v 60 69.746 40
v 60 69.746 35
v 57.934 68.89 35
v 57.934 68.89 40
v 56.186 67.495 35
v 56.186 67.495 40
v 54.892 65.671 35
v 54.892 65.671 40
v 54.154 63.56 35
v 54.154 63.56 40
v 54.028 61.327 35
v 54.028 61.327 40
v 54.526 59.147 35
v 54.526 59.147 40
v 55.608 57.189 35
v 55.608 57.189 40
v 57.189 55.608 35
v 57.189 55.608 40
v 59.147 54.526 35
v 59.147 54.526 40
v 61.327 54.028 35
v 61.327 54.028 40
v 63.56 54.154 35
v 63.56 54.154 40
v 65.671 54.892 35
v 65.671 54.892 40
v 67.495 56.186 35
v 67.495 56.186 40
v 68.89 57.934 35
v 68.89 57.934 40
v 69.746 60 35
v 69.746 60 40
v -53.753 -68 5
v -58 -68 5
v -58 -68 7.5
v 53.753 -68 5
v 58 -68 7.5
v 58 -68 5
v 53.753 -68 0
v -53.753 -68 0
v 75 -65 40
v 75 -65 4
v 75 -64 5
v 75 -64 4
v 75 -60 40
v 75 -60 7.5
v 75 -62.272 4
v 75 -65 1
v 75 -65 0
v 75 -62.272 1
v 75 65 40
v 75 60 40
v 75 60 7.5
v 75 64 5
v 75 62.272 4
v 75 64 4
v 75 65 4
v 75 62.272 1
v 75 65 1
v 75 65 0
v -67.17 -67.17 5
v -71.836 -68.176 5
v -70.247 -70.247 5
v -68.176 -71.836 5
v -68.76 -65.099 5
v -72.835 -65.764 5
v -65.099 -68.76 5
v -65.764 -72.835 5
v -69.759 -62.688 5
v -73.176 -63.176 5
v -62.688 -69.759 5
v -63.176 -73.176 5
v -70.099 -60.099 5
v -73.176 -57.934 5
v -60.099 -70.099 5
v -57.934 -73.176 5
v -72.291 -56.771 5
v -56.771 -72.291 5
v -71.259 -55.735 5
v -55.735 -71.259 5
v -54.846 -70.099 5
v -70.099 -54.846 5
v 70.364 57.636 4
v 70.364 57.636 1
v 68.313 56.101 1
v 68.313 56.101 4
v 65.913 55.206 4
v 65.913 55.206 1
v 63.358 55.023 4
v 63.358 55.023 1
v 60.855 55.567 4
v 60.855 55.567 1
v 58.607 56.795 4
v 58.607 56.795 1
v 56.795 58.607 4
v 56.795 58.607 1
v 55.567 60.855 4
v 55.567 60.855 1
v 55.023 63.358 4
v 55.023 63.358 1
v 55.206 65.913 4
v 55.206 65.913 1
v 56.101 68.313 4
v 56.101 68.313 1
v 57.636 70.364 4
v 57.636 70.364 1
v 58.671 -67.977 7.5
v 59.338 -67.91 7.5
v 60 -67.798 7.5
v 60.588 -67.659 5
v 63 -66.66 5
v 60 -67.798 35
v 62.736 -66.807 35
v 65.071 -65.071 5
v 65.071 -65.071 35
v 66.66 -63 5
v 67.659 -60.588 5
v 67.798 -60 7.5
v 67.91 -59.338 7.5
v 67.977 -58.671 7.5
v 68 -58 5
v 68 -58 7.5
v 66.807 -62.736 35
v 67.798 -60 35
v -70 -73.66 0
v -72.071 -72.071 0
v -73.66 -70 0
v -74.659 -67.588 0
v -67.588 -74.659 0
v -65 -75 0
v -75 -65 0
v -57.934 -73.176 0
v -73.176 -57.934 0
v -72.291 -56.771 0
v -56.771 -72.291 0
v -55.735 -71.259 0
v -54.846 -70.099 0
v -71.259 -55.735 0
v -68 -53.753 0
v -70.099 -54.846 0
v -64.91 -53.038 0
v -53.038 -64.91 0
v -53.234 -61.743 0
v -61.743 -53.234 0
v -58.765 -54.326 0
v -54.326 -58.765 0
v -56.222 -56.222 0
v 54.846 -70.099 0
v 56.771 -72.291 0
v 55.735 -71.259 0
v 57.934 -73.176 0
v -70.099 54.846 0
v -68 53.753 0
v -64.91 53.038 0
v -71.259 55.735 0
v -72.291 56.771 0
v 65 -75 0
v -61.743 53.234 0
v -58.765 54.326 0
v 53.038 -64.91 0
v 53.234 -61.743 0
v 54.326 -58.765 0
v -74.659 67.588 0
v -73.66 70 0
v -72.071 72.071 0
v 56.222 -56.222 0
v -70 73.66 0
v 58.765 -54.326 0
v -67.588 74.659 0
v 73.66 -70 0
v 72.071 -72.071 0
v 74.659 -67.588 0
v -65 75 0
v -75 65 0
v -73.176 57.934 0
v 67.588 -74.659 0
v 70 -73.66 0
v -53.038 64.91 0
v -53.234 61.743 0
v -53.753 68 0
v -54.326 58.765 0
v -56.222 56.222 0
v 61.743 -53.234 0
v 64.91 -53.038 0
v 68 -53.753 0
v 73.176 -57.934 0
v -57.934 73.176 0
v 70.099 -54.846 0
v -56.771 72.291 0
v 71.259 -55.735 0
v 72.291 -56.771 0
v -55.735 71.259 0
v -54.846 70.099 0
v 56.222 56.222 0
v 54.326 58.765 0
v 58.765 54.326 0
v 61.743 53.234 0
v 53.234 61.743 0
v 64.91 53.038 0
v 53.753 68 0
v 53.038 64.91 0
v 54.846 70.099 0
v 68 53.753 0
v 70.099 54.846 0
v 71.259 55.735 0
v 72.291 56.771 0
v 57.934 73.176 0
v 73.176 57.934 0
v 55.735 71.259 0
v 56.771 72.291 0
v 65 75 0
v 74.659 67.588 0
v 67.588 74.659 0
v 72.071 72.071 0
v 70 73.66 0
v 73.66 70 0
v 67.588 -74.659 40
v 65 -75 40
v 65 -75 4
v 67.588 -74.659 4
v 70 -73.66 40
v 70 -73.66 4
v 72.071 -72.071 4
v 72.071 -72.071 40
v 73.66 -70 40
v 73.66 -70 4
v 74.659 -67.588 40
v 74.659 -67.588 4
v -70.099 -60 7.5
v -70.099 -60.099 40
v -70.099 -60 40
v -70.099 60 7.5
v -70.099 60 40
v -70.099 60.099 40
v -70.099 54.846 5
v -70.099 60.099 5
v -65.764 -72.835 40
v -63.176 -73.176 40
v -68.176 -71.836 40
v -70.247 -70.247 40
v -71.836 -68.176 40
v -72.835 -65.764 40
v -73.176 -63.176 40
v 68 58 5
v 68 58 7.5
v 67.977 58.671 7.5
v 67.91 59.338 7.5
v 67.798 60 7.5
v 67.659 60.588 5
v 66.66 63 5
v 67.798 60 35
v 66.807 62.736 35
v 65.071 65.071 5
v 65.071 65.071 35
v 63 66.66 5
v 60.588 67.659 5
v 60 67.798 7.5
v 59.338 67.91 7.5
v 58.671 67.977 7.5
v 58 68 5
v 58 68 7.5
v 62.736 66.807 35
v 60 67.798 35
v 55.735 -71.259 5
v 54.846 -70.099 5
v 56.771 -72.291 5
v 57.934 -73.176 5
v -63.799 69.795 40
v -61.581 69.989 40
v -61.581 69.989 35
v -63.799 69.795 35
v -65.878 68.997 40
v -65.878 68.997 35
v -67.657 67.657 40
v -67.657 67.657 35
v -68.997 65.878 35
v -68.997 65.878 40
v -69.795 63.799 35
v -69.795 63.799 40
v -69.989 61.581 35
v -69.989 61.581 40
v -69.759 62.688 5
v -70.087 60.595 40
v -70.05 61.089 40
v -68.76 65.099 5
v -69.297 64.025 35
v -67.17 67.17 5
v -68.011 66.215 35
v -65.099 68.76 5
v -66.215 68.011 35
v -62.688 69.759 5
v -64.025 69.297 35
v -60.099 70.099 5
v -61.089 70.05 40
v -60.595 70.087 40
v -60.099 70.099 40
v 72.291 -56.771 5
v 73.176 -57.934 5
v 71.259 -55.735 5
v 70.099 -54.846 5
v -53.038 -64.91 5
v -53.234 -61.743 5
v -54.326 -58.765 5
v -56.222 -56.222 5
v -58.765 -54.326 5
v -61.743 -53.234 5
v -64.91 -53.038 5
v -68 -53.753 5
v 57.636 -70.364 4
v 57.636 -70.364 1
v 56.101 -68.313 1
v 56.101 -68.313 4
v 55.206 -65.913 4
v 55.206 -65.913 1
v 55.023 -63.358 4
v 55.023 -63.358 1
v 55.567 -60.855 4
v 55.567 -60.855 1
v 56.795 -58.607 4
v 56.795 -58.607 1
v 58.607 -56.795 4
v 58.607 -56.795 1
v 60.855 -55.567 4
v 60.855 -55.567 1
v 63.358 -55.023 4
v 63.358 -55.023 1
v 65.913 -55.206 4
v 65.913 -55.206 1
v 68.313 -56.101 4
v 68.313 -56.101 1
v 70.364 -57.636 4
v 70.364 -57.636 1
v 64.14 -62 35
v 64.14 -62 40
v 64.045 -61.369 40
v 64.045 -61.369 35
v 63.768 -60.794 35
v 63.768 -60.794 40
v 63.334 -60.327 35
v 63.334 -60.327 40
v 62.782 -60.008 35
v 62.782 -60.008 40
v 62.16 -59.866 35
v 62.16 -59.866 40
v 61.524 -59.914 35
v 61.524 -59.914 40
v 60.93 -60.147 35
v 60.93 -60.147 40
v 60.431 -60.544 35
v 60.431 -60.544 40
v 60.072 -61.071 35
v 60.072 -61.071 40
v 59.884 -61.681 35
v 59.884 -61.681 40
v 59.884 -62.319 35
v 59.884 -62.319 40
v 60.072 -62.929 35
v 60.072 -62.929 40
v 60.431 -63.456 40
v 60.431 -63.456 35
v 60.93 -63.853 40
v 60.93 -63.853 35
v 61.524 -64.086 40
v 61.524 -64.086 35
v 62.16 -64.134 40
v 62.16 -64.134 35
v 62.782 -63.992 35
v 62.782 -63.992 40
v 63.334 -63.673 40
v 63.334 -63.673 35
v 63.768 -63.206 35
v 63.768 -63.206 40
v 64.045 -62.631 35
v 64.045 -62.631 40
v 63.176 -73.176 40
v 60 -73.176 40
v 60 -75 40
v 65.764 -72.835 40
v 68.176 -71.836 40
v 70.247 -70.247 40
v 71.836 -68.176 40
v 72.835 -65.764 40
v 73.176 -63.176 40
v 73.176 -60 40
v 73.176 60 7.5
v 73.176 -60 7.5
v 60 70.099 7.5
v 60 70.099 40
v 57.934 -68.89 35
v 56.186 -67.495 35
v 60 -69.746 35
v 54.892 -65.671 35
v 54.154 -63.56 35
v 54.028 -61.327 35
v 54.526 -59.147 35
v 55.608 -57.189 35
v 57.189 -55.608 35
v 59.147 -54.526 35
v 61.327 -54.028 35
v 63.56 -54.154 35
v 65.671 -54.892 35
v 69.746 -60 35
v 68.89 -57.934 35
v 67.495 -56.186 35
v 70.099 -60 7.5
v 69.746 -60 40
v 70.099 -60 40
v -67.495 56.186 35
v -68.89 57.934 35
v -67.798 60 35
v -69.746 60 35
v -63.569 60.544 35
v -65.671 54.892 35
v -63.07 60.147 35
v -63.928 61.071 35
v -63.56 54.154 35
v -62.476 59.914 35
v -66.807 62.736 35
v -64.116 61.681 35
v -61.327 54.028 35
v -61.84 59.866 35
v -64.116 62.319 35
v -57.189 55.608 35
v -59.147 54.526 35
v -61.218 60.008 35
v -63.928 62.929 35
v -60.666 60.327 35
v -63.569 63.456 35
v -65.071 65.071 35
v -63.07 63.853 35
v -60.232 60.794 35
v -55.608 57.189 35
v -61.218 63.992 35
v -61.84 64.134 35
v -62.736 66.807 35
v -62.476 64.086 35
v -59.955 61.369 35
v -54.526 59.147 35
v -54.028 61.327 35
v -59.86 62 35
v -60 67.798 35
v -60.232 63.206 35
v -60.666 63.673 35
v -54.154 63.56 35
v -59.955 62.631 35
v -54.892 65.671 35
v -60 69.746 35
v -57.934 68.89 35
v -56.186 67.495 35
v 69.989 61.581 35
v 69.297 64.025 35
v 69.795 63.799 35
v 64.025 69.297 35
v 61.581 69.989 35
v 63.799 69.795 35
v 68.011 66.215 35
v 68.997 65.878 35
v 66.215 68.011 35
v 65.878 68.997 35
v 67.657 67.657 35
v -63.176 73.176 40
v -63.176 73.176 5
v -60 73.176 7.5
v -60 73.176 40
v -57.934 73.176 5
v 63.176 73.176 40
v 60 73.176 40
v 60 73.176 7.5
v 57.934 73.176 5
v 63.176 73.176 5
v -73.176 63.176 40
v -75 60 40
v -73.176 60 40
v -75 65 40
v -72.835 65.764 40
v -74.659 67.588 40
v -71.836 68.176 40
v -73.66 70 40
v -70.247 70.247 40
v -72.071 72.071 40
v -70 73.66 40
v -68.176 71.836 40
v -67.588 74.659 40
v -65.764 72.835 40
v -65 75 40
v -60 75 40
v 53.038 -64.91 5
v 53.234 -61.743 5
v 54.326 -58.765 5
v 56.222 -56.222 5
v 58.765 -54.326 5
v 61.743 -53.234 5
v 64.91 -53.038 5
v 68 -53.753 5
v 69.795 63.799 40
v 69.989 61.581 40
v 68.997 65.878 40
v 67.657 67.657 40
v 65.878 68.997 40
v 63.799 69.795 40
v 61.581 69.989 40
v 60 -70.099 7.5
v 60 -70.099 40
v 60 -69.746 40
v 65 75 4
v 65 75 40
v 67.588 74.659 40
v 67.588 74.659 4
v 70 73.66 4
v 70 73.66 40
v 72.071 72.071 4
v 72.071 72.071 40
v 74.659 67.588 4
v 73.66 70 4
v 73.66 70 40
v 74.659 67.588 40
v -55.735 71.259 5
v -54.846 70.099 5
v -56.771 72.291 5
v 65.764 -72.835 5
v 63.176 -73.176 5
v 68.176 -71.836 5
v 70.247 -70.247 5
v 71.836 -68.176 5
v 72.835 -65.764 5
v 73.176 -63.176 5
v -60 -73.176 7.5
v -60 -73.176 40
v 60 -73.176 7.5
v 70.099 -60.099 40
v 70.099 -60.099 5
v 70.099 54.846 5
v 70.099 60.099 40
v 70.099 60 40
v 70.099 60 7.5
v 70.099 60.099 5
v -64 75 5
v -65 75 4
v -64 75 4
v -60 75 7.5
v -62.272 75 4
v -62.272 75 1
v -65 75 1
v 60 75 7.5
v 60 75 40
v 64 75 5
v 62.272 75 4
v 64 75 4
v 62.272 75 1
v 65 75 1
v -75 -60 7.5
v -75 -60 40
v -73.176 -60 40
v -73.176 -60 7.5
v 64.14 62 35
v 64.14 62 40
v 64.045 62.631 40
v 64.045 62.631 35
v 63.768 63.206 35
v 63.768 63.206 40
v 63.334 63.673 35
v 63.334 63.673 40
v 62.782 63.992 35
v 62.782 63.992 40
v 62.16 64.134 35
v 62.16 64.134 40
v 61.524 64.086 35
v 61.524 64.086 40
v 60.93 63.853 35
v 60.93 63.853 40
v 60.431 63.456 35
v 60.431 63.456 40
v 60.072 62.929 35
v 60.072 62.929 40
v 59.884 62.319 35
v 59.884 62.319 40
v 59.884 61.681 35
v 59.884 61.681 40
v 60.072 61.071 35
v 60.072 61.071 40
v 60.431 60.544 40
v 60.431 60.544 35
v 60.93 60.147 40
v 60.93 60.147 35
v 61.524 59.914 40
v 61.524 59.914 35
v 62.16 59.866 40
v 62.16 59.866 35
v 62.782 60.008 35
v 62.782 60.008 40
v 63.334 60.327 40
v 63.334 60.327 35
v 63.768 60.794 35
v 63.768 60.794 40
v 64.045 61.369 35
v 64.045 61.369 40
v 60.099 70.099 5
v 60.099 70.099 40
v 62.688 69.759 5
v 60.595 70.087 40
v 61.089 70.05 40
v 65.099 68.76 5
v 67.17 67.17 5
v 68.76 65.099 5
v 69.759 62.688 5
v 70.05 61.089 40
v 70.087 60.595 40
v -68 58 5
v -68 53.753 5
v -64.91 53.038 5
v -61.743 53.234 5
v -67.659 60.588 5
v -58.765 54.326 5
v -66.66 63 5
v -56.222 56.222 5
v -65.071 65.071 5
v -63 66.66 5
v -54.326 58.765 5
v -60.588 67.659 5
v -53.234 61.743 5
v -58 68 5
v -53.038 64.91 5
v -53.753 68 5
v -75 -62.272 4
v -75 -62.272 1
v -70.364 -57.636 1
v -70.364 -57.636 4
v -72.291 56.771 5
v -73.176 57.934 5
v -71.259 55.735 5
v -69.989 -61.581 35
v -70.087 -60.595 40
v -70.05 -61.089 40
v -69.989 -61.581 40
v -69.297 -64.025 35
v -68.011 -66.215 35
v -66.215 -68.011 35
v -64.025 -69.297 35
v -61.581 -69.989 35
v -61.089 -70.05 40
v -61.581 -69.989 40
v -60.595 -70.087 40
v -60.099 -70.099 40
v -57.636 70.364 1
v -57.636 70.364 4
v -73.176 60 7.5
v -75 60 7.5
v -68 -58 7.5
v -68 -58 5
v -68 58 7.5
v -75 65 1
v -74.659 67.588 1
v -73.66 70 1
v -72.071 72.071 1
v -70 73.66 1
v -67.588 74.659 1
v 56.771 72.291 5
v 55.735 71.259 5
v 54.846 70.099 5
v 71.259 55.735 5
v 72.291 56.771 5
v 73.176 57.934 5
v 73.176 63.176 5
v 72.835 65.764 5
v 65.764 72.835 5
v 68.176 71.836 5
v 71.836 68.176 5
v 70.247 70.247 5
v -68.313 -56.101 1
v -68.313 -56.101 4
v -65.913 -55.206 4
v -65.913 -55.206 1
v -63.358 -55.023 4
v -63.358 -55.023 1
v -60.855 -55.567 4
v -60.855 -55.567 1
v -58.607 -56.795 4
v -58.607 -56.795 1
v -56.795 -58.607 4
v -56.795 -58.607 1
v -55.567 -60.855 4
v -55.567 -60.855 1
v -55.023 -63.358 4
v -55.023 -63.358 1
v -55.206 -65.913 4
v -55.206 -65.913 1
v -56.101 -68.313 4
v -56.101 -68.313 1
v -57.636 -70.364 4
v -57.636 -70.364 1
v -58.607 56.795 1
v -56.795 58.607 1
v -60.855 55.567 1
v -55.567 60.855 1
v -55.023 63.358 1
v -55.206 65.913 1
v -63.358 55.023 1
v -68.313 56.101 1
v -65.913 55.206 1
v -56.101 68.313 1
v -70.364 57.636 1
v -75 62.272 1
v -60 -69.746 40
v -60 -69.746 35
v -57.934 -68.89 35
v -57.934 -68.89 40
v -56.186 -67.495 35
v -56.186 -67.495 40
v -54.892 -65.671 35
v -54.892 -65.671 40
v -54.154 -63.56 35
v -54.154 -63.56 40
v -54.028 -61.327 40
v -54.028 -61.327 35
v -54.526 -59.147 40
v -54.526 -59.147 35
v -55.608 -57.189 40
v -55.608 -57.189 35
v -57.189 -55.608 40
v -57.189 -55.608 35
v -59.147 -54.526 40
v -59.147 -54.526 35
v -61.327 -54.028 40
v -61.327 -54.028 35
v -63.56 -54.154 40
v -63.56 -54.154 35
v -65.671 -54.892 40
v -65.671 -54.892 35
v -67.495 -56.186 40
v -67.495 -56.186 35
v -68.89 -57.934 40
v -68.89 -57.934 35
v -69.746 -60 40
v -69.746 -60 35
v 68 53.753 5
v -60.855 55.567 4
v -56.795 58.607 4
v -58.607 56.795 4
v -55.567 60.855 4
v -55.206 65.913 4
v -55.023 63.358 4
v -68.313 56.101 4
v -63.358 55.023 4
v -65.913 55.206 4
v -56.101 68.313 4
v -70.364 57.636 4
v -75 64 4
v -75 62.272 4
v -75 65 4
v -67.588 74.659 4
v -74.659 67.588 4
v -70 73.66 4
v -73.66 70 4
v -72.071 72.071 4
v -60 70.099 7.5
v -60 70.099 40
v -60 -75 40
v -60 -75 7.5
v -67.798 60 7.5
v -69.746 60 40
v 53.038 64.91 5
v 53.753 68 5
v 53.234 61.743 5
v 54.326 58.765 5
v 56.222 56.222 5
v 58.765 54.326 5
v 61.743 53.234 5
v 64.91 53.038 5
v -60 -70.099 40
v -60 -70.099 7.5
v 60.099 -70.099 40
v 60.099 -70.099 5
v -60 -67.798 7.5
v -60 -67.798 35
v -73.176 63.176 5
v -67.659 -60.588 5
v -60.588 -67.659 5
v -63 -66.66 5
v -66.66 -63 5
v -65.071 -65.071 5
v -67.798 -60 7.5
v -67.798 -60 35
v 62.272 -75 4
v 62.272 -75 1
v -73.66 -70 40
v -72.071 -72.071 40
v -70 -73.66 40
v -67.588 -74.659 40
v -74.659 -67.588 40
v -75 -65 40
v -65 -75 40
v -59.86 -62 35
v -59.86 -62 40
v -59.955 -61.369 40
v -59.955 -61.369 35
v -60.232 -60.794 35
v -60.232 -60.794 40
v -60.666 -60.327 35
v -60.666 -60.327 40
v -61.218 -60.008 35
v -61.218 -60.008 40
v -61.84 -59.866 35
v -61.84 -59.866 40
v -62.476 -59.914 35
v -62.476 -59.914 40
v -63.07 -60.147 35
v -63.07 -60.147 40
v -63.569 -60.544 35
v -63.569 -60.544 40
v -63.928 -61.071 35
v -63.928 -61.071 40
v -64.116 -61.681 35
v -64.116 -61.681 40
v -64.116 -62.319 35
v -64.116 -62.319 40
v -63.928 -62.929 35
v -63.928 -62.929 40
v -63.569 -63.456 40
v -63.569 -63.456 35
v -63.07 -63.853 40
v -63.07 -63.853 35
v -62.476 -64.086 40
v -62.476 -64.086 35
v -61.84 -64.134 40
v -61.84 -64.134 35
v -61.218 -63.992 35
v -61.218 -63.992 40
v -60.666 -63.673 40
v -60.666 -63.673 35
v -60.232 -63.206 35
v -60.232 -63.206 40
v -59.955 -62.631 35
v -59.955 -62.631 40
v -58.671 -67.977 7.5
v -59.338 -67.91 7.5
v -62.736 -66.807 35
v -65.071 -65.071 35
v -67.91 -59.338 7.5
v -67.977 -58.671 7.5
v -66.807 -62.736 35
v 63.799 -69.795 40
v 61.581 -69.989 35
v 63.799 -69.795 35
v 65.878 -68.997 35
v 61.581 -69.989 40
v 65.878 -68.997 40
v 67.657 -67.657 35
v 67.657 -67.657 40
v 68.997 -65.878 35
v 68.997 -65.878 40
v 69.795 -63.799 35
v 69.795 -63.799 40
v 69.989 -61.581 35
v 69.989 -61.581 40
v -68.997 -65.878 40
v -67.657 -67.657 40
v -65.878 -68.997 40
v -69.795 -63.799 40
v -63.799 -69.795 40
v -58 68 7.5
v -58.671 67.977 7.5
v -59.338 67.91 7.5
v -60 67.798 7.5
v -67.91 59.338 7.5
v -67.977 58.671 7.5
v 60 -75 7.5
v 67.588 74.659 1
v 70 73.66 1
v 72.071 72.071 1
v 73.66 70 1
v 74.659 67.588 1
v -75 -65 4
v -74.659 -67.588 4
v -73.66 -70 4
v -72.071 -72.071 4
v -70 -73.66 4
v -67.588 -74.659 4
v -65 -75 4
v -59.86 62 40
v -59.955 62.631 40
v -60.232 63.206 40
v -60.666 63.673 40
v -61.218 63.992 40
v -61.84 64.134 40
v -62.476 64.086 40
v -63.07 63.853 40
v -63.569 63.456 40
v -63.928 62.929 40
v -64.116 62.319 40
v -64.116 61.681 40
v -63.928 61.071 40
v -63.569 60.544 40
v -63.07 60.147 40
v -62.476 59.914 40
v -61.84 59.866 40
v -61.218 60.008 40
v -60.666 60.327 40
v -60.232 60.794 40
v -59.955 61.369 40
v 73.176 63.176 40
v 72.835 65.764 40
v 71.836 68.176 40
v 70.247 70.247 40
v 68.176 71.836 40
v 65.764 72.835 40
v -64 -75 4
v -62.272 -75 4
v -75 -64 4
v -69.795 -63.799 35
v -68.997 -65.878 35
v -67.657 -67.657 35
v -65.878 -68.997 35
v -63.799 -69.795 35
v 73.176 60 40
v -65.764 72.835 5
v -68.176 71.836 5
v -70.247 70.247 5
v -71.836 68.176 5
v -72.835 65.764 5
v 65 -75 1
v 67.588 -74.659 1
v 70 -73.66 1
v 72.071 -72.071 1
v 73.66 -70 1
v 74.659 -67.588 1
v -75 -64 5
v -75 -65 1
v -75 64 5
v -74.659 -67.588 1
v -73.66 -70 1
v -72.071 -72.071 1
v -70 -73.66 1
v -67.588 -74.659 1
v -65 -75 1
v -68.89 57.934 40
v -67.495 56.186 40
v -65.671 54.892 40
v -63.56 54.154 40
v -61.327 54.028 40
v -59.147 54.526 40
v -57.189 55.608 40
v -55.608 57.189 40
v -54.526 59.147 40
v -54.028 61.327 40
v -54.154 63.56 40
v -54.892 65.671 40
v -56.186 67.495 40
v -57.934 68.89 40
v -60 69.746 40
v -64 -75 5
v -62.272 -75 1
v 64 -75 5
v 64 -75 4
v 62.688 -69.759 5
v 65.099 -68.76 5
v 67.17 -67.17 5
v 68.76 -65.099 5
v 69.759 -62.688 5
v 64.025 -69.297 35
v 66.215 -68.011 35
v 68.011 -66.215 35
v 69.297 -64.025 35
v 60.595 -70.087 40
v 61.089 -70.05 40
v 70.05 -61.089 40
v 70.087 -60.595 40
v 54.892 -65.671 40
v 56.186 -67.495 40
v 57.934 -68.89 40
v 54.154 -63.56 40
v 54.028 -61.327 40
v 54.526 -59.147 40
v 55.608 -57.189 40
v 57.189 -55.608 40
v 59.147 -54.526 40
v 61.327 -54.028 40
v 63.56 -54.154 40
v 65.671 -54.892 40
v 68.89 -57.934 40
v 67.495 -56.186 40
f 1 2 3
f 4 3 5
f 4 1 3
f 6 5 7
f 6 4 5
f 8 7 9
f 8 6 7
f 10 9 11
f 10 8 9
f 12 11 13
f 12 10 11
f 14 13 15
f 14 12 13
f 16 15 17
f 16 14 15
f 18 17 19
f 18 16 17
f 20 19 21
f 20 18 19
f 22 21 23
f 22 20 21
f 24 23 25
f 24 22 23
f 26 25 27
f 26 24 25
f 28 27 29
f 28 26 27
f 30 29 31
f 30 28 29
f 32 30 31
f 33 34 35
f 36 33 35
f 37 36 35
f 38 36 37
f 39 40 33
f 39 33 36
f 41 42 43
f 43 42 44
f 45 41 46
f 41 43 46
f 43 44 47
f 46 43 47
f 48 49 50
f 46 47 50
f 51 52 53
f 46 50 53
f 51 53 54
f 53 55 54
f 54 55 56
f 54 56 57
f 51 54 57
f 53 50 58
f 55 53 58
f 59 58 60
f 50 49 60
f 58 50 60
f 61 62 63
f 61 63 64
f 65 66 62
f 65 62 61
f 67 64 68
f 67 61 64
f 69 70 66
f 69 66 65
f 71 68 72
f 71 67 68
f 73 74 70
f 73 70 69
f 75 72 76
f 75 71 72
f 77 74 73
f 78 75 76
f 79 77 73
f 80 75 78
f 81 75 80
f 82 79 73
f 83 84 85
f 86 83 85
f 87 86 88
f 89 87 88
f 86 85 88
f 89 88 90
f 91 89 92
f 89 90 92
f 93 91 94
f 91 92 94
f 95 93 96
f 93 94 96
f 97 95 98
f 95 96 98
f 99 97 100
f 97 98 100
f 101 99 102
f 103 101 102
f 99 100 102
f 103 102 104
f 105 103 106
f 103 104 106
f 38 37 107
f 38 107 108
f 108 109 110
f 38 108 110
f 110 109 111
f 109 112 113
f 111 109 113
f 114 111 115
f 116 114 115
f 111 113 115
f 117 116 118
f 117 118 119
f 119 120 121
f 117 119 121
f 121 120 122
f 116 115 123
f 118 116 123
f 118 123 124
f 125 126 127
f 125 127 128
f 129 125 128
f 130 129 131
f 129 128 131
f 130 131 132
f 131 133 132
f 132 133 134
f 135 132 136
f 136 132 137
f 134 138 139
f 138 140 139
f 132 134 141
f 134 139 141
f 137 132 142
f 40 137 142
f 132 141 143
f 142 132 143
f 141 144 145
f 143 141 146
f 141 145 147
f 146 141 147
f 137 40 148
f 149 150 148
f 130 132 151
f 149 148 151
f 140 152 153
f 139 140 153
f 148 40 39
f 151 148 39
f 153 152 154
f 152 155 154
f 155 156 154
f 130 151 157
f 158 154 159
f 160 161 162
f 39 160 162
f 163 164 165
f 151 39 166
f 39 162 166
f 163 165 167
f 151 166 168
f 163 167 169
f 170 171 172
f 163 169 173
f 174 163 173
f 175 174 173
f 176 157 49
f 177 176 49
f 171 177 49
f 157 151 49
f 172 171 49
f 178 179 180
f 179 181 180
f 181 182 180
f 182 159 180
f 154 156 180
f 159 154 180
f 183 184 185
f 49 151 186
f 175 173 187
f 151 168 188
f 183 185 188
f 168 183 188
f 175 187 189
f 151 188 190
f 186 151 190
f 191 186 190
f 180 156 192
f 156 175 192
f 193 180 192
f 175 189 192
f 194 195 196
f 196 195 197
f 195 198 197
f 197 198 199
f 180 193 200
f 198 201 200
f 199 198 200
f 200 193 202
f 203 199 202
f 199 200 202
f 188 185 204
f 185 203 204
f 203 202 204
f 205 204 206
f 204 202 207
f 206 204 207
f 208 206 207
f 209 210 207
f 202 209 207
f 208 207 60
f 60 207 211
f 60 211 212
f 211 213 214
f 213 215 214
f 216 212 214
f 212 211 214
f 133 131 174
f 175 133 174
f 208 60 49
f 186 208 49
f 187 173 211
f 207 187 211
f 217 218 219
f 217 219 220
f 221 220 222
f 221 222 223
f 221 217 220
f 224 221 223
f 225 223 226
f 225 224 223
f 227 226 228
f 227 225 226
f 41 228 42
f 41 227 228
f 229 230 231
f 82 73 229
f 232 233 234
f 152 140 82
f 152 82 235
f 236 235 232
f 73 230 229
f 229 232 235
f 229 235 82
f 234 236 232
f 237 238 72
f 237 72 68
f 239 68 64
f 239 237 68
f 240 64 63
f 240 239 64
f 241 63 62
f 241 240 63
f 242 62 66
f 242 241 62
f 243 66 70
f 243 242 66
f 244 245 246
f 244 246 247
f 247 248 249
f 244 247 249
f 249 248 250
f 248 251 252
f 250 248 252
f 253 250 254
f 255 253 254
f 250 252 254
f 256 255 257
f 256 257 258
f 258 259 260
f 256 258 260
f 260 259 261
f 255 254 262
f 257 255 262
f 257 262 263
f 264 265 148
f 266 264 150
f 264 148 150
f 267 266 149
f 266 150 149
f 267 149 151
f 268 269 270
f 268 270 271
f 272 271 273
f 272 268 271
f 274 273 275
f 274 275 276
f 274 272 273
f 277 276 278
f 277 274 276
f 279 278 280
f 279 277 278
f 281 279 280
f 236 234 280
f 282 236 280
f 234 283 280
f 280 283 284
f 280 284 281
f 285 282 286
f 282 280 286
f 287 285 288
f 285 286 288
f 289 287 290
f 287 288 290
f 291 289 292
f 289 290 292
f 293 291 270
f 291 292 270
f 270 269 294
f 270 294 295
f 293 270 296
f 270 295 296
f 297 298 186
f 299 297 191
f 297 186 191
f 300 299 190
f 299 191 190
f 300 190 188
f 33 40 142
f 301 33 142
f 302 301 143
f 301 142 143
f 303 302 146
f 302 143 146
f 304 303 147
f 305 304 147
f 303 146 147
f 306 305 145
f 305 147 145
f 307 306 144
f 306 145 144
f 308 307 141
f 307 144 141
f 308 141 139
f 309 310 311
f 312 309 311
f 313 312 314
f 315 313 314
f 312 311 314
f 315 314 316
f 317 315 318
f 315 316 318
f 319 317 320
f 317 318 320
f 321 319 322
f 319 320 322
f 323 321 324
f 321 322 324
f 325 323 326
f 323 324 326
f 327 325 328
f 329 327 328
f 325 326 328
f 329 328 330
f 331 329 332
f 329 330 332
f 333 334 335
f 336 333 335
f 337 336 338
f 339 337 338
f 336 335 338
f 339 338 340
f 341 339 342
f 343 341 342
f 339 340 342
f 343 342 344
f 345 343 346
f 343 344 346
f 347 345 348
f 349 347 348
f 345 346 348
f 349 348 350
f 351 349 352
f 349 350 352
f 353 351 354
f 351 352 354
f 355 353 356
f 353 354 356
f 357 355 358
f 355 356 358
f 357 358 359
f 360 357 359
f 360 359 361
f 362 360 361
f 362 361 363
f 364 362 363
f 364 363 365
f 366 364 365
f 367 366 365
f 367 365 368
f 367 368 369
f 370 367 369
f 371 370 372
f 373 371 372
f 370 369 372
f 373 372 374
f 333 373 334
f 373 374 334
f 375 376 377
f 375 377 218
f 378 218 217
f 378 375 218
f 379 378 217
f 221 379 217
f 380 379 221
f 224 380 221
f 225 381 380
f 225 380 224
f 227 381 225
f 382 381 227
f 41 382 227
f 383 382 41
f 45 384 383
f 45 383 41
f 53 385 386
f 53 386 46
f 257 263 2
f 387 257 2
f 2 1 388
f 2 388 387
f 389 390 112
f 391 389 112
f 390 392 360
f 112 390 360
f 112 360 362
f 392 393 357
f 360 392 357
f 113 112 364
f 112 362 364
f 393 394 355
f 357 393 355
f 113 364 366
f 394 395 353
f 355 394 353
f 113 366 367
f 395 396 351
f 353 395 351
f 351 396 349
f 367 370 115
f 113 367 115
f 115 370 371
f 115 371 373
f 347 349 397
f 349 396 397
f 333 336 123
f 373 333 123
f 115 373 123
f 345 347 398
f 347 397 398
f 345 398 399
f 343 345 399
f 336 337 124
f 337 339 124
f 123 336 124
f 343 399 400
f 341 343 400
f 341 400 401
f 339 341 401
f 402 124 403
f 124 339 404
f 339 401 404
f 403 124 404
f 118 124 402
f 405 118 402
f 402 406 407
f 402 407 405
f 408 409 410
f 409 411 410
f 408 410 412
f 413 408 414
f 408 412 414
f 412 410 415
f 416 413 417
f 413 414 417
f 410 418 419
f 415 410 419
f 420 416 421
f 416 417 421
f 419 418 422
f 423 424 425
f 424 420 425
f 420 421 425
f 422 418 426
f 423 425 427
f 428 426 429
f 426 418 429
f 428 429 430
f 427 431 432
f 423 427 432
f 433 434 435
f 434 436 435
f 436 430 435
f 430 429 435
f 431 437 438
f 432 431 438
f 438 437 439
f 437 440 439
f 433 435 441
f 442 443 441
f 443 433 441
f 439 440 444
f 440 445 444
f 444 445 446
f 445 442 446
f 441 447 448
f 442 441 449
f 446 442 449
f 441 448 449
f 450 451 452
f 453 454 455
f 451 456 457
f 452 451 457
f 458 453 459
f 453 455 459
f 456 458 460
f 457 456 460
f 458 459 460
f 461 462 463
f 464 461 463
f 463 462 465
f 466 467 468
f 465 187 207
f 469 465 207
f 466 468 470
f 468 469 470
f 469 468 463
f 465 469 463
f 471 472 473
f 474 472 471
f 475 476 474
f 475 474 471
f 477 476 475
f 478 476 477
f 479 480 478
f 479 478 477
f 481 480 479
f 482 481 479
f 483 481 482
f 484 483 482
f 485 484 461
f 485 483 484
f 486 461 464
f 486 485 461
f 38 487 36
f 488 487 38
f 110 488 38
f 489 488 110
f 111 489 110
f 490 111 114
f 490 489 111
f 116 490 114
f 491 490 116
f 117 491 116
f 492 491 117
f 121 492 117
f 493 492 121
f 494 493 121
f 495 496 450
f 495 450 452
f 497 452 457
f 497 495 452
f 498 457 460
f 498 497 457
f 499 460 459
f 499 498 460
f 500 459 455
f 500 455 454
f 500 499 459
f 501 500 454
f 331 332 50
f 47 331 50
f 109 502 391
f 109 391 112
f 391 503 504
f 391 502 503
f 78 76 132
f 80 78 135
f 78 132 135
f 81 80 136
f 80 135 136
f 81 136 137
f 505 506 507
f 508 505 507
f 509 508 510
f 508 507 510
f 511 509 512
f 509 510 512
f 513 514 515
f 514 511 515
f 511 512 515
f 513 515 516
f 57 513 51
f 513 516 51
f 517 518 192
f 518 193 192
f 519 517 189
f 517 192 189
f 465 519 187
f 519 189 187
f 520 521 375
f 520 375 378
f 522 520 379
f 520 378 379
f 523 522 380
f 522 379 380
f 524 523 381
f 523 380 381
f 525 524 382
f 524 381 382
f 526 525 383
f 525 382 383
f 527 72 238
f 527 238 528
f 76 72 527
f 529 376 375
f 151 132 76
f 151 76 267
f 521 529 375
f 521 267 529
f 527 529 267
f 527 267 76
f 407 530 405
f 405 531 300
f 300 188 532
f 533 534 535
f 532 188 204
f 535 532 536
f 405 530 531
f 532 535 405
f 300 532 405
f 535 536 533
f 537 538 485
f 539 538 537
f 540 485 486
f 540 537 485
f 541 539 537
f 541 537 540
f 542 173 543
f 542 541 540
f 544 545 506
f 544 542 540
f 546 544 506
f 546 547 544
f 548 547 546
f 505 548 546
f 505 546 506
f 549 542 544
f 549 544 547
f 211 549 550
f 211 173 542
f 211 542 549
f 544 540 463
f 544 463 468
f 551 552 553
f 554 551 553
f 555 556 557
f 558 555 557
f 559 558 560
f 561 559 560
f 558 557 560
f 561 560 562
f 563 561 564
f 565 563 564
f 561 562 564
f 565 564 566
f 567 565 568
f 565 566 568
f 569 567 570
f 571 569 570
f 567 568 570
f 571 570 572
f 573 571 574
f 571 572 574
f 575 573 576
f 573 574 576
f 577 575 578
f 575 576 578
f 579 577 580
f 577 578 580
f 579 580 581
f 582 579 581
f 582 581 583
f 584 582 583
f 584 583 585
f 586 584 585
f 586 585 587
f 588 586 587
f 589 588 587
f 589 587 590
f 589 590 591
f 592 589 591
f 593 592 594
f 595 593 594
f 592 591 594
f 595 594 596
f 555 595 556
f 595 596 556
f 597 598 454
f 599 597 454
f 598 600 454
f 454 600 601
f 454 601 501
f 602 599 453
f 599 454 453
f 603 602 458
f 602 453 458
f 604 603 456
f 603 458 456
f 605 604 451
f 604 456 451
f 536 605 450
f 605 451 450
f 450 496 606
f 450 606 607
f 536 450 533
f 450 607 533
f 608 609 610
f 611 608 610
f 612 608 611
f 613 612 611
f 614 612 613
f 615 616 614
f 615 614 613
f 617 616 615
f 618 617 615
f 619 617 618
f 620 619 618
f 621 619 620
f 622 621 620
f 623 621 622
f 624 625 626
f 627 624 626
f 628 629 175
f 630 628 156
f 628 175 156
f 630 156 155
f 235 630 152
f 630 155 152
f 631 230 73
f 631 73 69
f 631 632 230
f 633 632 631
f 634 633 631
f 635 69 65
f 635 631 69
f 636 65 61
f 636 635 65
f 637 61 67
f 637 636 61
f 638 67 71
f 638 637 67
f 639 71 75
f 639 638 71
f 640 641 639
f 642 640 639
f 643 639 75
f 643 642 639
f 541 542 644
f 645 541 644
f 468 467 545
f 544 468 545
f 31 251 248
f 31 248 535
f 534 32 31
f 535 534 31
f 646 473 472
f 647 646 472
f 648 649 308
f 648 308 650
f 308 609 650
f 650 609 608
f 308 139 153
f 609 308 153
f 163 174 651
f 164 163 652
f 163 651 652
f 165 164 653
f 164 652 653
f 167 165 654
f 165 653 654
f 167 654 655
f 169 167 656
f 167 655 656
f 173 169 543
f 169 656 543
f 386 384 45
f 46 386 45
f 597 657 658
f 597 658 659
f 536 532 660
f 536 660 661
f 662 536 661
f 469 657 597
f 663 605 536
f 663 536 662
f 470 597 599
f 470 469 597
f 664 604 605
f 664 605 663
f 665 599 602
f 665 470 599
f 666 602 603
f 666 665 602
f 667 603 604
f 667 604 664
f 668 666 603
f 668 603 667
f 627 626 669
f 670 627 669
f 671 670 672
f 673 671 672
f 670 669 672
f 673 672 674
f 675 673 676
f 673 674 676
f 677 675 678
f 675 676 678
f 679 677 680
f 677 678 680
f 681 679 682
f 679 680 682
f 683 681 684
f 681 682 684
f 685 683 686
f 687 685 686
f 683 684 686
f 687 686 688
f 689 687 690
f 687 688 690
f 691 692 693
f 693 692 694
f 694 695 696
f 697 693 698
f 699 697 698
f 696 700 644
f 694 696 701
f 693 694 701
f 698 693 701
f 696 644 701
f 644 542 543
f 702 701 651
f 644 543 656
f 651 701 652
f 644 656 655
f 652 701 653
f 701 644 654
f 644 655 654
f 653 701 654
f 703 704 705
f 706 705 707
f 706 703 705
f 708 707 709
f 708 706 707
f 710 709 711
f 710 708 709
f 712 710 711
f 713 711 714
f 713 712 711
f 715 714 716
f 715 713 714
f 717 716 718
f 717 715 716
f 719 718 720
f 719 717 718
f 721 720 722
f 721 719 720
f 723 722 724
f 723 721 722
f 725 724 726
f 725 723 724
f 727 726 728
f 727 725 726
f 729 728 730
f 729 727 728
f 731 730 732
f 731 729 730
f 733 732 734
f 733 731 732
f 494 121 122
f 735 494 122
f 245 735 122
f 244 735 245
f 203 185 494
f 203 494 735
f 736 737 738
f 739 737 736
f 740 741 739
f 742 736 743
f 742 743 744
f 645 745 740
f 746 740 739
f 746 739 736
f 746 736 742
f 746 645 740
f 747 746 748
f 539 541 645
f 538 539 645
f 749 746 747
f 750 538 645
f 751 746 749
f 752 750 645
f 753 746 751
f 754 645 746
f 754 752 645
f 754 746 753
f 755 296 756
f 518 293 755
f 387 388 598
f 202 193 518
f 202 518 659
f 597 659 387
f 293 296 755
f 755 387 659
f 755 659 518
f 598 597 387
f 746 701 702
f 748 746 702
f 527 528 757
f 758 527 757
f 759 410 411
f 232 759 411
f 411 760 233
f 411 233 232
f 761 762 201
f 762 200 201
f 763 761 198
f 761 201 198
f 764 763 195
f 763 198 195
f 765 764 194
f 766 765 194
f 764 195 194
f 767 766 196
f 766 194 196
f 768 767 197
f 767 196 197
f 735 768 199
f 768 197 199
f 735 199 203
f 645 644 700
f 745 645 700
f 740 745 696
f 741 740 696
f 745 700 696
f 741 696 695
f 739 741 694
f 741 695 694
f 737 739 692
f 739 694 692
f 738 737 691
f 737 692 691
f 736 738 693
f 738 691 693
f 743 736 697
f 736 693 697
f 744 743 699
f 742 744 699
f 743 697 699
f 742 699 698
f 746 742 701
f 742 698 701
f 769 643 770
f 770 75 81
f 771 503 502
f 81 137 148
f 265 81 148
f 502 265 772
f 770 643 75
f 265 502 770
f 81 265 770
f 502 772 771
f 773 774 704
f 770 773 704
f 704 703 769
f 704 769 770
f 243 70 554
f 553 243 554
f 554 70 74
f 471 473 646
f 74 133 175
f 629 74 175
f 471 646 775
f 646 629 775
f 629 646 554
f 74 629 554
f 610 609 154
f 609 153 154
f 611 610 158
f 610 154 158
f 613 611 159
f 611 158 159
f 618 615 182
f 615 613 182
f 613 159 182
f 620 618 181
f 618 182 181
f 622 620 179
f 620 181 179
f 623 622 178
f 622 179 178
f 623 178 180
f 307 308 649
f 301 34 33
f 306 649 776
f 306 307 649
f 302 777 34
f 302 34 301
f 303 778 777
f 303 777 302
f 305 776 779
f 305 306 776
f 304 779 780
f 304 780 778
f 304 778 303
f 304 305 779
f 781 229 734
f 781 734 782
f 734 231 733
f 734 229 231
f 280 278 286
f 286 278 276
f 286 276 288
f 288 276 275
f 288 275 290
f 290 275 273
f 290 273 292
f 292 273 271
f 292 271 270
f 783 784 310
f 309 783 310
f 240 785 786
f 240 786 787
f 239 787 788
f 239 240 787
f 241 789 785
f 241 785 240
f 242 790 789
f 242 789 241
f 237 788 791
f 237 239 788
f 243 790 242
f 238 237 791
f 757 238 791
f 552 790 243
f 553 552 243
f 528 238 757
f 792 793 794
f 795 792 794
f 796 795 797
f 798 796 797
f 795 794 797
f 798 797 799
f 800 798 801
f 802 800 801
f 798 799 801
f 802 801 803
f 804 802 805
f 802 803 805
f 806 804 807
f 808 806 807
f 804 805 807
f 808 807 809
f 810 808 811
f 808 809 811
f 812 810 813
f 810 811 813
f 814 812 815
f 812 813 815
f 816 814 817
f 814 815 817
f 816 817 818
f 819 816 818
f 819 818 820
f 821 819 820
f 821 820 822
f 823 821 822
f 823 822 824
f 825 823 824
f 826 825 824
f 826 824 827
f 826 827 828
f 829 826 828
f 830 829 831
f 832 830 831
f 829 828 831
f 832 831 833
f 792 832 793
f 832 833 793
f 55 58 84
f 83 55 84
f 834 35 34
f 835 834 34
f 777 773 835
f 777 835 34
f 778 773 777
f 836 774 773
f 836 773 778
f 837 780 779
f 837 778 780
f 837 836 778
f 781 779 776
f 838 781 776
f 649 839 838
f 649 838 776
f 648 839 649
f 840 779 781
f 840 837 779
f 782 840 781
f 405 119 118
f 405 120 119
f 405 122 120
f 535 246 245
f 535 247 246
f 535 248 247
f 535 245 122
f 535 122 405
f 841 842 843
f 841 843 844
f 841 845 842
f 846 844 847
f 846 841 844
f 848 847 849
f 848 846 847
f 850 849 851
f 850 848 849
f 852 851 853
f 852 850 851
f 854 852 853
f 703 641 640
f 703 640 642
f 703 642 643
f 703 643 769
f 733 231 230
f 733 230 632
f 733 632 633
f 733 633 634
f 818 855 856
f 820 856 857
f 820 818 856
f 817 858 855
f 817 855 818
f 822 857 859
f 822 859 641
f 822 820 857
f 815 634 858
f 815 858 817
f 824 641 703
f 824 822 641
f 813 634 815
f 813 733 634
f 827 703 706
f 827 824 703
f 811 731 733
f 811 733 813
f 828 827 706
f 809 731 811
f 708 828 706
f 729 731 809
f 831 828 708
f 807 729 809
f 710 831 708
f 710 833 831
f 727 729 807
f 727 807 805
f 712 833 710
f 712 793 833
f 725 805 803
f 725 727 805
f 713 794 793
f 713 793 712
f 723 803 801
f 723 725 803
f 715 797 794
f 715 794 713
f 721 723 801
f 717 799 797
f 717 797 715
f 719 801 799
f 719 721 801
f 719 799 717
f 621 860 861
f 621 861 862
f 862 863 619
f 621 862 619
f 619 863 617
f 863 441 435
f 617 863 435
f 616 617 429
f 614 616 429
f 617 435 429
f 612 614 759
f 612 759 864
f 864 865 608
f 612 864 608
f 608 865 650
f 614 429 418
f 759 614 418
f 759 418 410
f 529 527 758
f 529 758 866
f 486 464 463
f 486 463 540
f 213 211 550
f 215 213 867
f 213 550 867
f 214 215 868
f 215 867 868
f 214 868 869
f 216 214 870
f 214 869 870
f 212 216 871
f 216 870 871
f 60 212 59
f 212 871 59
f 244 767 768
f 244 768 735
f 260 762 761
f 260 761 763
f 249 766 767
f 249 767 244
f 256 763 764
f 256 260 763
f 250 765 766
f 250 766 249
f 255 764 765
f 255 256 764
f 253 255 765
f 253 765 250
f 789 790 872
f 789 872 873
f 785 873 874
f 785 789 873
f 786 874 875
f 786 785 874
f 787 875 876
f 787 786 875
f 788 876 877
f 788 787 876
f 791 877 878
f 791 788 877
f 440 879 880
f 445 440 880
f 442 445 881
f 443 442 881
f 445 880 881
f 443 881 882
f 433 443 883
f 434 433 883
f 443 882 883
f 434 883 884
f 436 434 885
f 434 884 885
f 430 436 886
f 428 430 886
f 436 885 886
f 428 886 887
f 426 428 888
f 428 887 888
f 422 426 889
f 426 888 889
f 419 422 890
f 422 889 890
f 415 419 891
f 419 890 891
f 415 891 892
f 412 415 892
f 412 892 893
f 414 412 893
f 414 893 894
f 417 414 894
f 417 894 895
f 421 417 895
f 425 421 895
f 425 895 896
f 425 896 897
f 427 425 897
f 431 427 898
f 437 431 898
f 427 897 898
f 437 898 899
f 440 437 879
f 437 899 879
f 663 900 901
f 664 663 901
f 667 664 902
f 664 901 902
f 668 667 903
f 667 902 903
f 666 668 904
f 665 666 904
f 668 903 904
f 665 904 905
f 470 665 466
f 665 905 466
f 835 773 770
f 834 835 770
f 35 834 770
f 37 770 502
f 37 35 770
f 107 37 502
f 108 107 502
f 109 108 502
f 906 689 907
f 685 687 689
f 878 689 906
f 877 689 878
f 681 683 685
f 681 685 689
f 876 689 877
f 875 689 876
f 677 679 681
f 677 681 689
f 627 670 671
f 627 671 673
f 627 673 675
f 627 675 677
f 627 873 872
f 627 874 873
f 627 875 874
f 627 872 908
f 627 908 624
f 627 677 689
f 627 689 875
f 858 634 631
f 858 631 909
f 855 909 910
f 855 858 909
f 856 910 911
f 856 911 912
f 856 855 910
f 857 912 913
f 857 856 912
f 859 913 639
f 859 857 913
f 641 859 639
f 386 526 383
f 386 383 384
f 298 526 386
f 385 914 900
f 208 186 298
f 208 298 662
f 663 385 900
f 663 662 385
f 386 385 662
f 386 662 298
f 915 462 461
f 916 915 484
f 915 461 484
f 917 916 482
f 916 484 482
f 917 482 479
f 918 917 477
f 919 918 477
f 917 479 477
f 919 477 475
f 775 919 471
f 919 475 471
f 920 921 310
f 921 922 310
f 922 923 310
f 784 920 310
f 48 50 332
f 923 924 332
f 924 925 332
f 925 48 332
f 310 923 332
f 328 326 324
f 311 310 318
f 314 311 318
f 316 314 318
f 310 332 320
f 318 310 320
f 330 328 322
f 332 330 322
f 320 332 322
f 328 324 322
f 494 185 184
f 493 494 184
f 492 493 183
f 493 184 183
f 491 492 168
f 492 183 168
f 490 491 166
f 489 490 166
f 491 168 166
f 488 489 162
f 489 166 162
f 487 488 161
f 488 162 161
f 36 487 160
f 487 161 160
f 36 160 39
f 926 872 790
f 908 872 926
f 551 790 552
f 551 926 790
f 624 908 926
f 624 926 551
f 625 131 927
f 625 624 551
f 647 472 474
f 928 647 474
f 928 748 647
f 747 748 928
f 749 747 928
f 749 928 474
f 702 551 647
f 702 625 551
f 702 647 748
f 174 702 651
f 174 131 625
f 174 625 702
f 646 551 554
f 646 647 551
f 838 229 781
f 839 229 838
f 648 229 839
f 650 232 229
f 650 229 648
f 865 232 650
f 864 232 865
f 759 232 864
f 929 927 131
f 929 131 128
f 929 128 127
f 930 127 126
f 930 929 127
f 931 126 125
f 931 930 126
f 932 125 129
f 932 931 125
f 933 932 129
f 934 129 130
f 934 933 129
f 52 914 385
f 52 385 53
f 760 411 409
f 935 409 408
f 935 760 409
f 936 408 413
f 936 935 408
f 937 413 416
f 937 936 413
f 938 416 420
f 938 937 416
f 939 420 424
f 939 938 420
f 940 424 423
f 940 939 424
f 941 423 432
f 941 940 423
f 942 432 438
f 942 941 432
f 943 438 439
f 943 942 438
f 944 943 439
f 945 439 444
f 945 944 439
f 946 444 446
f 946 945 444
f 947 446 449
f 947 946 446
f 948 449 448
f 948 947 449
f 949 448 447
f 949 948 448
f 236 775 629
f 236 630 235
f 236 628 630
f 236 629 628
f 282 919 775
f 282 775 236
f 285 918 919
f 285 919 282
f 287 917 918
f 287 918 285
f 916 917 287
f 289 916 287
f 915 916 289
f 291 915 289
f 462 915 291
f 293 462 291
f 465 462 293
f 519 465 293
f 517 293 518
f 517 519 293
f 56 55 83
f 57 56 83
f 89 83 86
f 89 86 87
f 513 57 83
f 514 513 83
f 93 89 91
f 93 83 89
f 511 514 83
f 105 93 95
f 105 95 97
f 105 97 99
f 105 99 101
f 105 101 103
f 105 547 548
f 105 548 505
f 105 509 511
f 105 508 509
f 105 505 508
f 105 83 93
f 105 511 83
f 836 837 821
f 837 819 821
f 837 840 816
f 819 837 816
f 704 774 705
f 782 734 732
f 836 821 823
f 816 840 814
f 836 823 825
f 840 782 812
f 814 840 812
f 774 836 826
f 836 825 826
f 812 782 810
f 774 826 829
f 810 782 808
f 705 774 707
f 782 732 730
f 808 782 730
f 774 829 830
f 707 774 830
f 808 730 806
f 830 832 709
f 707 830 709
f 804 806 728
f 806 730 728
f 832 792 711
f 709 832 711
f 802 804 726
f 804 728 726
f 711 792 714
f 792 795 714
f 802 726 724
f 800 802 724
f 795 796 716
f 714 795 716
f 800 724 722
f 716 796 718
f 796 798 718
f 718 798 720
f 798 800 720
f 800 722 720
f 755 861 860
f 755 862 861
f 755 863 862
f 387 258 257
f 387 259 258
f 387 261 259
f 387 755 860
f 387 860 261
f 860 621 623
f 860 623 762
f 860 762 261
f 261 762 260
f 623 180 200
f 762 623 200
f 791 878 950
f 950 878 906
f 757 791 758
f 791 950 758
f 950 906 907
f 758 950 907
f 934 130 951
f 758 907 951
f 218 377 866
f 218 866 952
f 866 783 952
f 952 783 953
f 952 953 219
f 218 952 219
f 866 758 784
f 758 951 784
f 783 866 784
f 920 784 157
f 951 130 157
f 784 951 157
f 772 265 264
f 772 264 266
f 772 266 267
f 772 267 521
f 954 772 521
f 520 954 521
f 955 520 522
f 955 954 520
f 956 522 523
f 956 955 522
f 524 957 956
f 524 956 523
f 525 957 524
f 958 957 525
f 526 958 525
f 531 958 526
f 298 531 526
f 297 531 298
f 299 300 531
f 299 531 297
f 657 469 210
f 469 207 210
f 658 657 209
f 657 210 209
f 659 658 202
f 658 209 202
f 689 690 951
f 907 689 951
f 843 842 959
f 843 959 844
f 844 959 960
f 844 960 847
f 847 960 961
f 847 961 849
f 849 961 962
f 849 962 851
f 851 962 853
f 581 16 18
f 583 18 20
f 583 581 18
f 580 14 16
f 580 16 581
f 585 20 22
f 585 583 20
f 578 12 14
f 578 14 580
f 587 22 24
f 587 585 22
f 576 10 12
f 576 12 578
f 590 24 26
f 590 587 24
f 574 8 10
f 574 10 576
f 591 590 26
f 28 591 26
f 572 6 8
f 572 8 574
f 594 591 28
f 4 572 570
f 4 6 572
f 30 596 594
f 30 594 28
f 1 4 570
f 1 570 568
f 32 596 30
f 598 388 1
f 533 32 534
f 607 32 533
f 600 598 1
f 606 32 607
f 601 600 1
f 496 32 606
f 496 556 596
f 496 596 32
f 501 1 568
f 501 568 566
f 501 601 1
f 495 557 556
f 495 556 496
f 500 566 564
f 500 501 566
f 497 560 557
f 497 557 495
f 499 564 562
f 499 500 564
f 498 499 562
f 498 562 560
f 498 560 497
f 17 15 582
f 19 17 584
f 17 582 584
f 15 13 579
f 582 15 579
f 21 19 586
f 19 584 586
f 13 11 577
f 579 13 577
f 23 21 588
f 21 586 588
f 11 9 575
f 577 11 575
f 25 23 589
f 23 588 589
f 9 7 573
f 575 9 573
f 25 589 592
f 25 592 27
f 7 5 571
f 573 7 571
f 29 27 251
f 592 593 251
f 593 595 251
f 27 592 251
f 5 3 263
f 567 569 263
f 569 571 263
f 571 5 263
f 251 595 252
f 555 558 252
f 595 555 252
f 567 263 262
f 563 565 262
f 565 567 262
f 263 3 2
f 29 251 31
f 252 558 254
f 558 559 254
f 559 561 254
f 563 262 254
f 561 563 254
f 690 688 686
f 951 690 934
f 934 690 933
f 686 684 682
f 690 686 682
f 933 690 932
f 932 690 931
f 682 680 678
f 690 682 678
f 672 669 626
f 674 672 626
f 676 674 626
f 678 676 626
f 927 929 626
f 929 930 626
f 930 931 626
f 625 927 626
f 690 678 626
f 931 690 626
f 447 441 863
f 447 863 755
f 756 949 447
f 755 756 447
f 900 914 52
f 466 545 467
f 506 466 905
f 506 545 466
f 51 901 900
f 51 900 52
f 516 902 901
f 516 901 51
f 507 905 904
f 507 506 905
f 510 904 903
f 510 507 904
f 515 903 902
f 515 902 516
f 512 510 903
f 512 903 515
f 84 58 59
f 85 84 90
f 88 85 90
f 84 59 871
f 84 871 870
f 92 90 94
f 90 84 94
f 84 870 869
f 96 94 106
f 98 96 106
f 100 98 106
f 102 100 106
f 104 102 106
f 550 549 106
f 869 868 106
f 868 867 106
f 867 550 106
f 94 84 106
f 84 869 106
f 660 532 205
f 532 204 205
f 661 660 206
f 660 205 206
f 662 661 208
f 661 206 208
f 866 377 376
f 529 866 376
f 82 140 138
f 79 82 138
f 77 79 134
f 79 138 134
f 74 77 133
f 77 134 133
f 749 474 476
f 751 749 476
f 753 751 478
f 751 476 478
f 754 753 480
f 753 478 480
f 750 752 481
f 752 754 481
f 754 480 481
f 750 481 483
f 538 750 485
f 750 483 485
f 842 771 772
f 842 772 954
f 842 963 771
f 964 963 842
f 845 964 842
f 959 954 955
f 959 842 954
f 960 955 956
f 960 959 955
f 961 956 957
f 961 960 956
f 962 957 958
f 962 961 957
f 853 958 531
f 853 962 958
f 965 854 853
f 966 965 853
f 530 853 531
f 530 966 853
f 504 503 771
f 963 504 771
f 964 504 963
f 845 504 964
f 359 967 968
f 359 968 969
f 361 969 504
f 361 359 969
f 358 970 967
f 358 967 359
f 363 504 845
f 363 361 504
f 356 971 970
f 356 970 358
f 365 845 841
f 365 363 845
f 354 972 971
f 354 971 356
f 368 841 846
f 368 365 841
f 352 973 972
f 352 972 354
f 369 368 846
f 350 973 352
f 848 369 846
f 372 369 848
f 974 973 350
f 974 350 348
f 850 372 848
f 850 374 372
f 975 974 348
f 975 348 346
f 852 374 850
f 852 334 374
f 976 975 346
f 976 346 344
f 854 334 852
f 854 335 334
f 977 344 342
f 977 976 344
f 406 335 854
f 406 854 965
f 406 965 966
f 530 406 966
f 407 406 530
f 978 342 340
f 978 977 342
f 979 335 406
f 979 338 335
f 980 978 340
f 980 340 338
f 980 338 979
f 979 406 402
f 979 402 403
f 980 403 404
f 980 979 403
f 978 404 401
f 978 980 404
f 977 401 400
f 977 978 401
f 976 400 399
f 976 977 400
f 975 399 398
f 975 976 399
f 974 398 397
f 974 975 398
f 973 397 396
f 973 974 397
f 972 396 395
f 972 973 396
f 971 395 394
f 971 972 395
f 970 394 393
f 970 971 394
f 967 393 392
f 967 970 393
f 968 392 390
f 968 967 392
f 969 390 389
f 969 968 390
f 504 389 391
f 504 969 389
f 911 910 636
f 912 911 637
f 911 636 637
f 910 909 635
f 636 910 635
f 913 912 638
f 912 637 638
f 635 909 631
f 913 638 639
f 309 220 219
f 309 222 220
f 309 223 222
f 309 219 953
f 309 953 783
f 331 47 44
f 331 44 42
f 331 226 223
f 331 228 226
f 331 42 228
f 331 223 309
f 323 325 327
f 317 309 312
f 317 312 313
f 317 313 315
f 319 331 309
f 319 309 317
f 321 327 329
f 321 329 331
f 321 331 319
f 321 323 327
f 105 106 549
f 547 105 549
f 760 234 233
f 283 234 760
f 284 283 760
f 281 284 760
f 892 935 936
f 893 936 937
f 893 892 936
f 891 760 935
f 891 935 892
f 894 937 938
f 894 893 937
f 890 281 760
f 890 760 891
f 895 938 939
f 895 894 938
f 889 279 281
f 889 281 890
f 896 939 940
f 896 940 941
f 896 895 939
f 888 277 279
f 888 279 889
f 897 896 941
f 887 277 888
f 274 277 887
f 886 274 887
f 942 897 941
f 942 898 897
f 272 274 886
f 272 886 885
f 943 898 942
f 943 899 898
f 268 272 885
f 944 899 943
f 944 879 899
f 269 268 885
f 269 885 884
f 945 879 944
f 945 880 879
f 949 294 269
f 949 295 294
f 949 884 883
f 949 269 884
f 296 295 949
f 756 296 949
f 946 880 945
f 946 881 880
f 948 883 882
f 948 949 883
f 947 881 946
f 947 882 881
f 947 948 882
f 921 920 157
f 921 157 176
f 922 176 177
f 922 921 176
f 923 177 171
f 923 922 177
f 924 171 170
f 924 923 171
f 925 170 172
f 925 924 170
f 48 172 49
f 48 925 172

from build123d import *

# Parameters (mm, degrees)
SKETCH1_R             = 11
BOSS_EXTRUDE1_DEPTH   = 5
BOSS_EXTRUDE1_2_DEPTH = 5
BOSS_EXTRUDE1_3_DEPTH = 5
BOSS_EXTRUDE1_4_DEPTH = 5
BOSS_EXTRUDE2_START   = 1
BOSS_EXTRUDE2_DEPTH   = 3
BOSS_EXTRUDE2_2_DEPTH = 3
BOSS_EXTRUDE2_3_DEPTH = 3
BOSS_EXTRUDE2_4_DEPTH = 3
SKETCH3_W             = 150
SKETCH3_H             = 150
SKETCH3_W_2           = 146.352390556
SKETCH3_H_2           = 146.352390556
BOSS_EXTRUDE4_DEPTH   = 40
SKETCH3_W_3           = 140.198704382
SKETCH3_H_3           = 140.198704382
SKETCH3_W_4           = 136
SKETCH3_H_4           = 136
BOSS_EXTRUDE4_2_DEPTH = 40
FILLET1_R             = 10
FILLET2_R             = 10
BOSS_EXTRUDE6_START   = 40
SKETCH6_W             = 120
SKETCH6_H             = 120
SKETCH6_H_2           = 23.888569694
SKETCH6_W_2           = 20.217809466
BOSS_EXTRUDE6_DEPTH   = 32.5
SKETCH7_R             = 8
SKETCH7_R_2           = 2.14
BOSS_EXTRUDE7_DEPTH   = 5


with BuildPart() as part:
    # Sketch1 → Boss-Extrude1 (new body)
    with BuildSketch(Plane.XY):
        with Locations((-64, -64)):
            Circle(SKETCH1_R)
    extrude(amount=BOSS_EXTRUDE1_DEPTH)


with BuildPart() as body_2:
    # Sketch1 → Boss-Extrude1 2 (new body)
    with BuildSketch(Plane.XY):
        with Locations((-64, 64)):
            Circle(SKETCH1_R)
    extrude(amount=BOSS_EXTRUDE1_2_DEPTH)


with BuildPart() as body_3:
    # Sketch1 → Boss-Extrude1 3 (new body)
    with BuildSketch(Plane.XY):
        with Locations((64, -64)):
            Circle(SKETCH1_R)
    extrude(amount=BOSS_EXTRUDE1_3_DEPTH)


with BuildPart() as body_4:
    # Sketch1 → Boss-Extrude1 4 (new body)
    with BuildSketch(Plane.XY):
        with Locations((64, 64)):
            Circle(SKETCH1_R)
    extrude(amount=BOSS_EXTRUDE1_4_DEPTH)


with BuildPart() as body_5:
    # Sketch2 → Boss-Extrude2 (new body)
    with BuildSketch(Plane.XY.offset(BOSS_EXTRUDE2_START)):
        with BuildLine():
            Line((-57.636038969, -70.363961031), (-77.792434068, -90.52035613))
            ThreePointArc((-77.792434068, -90.52035613), (-90.52035613, -90.52035613), (-90.52035613, -77.792434068))
            Line((-90.52035613, -77.792434068), (-70.363961031, -57.636038969))
            ThreePointArc((-70.363961031, -57.636038969), (-57.636038969, -57.636038969), (-57.636038969, -70.363961031))
        make_face()
    extrude(amount=BOSS_EXTRUDE2_DEPTH)


with BuildPart() as body_6:
    # Sketch2 → Boss-Extrude2 2 (new body)
    with BuildSketch(Plane.XY.offset(BOSS_EXTRUDE2_START)):
        with BuildLine():
            Line((-70.363961031, 57.636038969), (-87.555608123, 74.827686061))
            ThreePointArc((-87.555608123, 74.827686061), (-87.555608123, 87.555608123), (-74.827686061, 87.555608123))
            Line((-74.827686061, 87.555608123), (-57.636038969, 70.363961031))
            ThreePointArc((-57.636038969, 70.363961031), (-57.636038969, 57.636038969), (-70.363961031, 57.636038969))
        make_face()
    extrude(amount=BOSS_EXTRUDE2_2_DEPTH)


with BuildPart() as body_7:
    # Sketch2 → Boss-Extrude2 3 (new body)
    with BuildSketch(Plane.XY.offset(BOSS_EXTRUDE2_START)):
        with BuildLine():
            Line((70.363961031, -57.636038969), (87.260513721, -74.532591659))
            ThreePointArc((87.260513721, -74.532591659), (87.260513721, -87.260513721), (74.532591659, -87.260513721))
            Line((74.532591659, -87.260513721), (57.636038969, -70.363961031))
            ThreePointArc((57.636038969, -70.363961031), (57.636038969, -57.636038969), (70.363961031, -57.636038969))
        make_face()
    extrude(amount=BOSS_EXTRUDE2_3_DEPTH)


with BuildPart() as body_8:
    # Sketch2 → Boss-Extrude2 4 (new body)
    with BuildSketch(Plane.XY.offset(BOSS_EXTRUDE2_START)):
        with BuildLine():
            Line((57.636038969, 70.363961031), (76.733324594, 89.461246655))
            ThreePointArc((76.733324594, 89.461246655), (89.461246655, 89.461246655), (89.461246655, 76.733324594))
            Line((89.461246655, 76.733324594), (70.363961031, 57.636038969))
            ThreePointArc((70.363961031, 57.636038969), (57.636038969, 57.636038969), (57.636038969, 70.363961031))
        make_face()
    extrude(amount=BOSS_EXTRUDE2_4_DEPTH)


with BuildPart() as body_9:
    # Sketch3 → Boss-Extrude4 (new body)
    with BuildSketch(Plane.XY):
        Rectangle(SKETCH3_W, SKETCH3_H)
        Rectangle(SKETCH3_W_2, SKETCH3_H_2, mode=Mode.SUBTRACT)
    extrude(amount=BOSS_EXTRUDE4_DEPTH)

    # Fillet1
    fillet1_edges = [body_9.edges().sort_by_distance(p)[0] for p in [
        (-75, -75, 20),
        (-75, 75, 20),
        (75, 75, 20),
        (75, -75, 20),
        (-73.176195278, -73.176195278, 20),
        (73.176195278, -73.176195278, 20),
        (73.176195278, 73.176195278, 20),
        (-73.176195278, 73.176195278, 20),
    ]]
    fillet(fillet1_edges, radius=FILLET1_R)


with BuildPart() as body_10:
    # Sketch3 → Boss-Extrude4 2 (new body)
    with BuildSketch(Plane.XY):
        Rectangle(SKETCH3_W_3, SKETCH3_H_3)
        Rectangle(SKETCH3_W_4, SKETCH3_H_4, mode=Mode.SUBTRACT)
    extrude(amount=BOSS_EXTRUDE4_2_DEPTH)

    # Fillet2
    fillet2_edges = [body_10.edges().sort_by_distance(p)[0] for p in [
        (70.099352191, 70.099352191, 20),
        (70.099352191, -70.099352191, 20),
        (-70.099352191, -70.099352191, 20),
        (-70.099352191, 70.099352191, 20),
        (-68, -68, 20),
        (68, -68, 20),
        (68, 68, 20),
        (-68, 68, 20),
    ]]
    fillet(fillet2_edges, radius=FILLET2_R)


with BuildPart() as part_1:
    add(part.part)

    # Combine4: union body 4, body 3, body 2, body 9, body 10
    add(body_4.part)
    add(body_3.part)
    add(body_2.part)
    add(body_9.part)
    add(body_10.part)

    # Combine8: cut body 7, body 5, body 6, body 8
    add(body_7.part, mode=Mode.SUBTRACT)
    add(body_5.part, mode=Mode.SUBTRACT)
    add(body_6.part, mode=Mode.SUBTRACT)
    add(body_8.part, mode=Mode.SUBTRACT)


with BuildPart() as body_2_2:
    # Sketch6 → Boss-Extrude6 (new body)
    with BuildSketch(Plane.XY.offset(BOSS_EXTRUDE6_START)):
        Rectangle(SKETCH6_W, SKETCH6_H)
        with Locations((0, -71.944284847)):
            Rectangle(SKETCH6_W, SKETCH6_H_2)
        with Locations((-70.108904733, 0)):
            Rectangle(SKETCH6_W_2, SKETCH6_H)
        with Locations((0, 71.944284847)):
            Rectangle(SKETCH6_W, SKETCH6_H_2)
        with Locations((70.108904733, 0)):
            Rectangle(SKETCH6_W_2, SKETCH6_H)
    extrude(amount=-BOSS_EXTRUDE6_DEPTH)


with BuildPart() as part_2:
    add(part_1.part)

    # Combine9: cut body 2 2
    add(body_2_2.part, mode=Mode.SUBTRACT)

    # Sketch7 → Boss-Extrude7 (add)
    with BuildSketch(Plane.XY.offset(40)):
        with Locations((-62, -62)):
            Circle(SKETCH7_R)
        with Locations((-62, -62)):
            Circle(SKETCH7_R_2, mode=Mode.SUBTRACT)
        with Locations((-62, 62)):
            Circle(SKETCH7_R)
        with Locations((-62, 62)):
            Circle(SKETCH7_R_2, mode=Mode.SUBTRACT)
        with Locations((62, -62)):
            Circle(SKETCH7_R)
        with Locations((62, -62)):
            Circle(SKETCH7_R_2, mode=Mode.SUBTRACT)
        with Locations((62, 62)):
            Circle(SKETCH7_R)
        with Locations((62, 62)):
            Circle(SKETCH7_R_2, mode=Mode.SUBTRACT)
    extrude(amount=-BOSS_EXTRUDE7_DEPTH)


solid = part_2.part
